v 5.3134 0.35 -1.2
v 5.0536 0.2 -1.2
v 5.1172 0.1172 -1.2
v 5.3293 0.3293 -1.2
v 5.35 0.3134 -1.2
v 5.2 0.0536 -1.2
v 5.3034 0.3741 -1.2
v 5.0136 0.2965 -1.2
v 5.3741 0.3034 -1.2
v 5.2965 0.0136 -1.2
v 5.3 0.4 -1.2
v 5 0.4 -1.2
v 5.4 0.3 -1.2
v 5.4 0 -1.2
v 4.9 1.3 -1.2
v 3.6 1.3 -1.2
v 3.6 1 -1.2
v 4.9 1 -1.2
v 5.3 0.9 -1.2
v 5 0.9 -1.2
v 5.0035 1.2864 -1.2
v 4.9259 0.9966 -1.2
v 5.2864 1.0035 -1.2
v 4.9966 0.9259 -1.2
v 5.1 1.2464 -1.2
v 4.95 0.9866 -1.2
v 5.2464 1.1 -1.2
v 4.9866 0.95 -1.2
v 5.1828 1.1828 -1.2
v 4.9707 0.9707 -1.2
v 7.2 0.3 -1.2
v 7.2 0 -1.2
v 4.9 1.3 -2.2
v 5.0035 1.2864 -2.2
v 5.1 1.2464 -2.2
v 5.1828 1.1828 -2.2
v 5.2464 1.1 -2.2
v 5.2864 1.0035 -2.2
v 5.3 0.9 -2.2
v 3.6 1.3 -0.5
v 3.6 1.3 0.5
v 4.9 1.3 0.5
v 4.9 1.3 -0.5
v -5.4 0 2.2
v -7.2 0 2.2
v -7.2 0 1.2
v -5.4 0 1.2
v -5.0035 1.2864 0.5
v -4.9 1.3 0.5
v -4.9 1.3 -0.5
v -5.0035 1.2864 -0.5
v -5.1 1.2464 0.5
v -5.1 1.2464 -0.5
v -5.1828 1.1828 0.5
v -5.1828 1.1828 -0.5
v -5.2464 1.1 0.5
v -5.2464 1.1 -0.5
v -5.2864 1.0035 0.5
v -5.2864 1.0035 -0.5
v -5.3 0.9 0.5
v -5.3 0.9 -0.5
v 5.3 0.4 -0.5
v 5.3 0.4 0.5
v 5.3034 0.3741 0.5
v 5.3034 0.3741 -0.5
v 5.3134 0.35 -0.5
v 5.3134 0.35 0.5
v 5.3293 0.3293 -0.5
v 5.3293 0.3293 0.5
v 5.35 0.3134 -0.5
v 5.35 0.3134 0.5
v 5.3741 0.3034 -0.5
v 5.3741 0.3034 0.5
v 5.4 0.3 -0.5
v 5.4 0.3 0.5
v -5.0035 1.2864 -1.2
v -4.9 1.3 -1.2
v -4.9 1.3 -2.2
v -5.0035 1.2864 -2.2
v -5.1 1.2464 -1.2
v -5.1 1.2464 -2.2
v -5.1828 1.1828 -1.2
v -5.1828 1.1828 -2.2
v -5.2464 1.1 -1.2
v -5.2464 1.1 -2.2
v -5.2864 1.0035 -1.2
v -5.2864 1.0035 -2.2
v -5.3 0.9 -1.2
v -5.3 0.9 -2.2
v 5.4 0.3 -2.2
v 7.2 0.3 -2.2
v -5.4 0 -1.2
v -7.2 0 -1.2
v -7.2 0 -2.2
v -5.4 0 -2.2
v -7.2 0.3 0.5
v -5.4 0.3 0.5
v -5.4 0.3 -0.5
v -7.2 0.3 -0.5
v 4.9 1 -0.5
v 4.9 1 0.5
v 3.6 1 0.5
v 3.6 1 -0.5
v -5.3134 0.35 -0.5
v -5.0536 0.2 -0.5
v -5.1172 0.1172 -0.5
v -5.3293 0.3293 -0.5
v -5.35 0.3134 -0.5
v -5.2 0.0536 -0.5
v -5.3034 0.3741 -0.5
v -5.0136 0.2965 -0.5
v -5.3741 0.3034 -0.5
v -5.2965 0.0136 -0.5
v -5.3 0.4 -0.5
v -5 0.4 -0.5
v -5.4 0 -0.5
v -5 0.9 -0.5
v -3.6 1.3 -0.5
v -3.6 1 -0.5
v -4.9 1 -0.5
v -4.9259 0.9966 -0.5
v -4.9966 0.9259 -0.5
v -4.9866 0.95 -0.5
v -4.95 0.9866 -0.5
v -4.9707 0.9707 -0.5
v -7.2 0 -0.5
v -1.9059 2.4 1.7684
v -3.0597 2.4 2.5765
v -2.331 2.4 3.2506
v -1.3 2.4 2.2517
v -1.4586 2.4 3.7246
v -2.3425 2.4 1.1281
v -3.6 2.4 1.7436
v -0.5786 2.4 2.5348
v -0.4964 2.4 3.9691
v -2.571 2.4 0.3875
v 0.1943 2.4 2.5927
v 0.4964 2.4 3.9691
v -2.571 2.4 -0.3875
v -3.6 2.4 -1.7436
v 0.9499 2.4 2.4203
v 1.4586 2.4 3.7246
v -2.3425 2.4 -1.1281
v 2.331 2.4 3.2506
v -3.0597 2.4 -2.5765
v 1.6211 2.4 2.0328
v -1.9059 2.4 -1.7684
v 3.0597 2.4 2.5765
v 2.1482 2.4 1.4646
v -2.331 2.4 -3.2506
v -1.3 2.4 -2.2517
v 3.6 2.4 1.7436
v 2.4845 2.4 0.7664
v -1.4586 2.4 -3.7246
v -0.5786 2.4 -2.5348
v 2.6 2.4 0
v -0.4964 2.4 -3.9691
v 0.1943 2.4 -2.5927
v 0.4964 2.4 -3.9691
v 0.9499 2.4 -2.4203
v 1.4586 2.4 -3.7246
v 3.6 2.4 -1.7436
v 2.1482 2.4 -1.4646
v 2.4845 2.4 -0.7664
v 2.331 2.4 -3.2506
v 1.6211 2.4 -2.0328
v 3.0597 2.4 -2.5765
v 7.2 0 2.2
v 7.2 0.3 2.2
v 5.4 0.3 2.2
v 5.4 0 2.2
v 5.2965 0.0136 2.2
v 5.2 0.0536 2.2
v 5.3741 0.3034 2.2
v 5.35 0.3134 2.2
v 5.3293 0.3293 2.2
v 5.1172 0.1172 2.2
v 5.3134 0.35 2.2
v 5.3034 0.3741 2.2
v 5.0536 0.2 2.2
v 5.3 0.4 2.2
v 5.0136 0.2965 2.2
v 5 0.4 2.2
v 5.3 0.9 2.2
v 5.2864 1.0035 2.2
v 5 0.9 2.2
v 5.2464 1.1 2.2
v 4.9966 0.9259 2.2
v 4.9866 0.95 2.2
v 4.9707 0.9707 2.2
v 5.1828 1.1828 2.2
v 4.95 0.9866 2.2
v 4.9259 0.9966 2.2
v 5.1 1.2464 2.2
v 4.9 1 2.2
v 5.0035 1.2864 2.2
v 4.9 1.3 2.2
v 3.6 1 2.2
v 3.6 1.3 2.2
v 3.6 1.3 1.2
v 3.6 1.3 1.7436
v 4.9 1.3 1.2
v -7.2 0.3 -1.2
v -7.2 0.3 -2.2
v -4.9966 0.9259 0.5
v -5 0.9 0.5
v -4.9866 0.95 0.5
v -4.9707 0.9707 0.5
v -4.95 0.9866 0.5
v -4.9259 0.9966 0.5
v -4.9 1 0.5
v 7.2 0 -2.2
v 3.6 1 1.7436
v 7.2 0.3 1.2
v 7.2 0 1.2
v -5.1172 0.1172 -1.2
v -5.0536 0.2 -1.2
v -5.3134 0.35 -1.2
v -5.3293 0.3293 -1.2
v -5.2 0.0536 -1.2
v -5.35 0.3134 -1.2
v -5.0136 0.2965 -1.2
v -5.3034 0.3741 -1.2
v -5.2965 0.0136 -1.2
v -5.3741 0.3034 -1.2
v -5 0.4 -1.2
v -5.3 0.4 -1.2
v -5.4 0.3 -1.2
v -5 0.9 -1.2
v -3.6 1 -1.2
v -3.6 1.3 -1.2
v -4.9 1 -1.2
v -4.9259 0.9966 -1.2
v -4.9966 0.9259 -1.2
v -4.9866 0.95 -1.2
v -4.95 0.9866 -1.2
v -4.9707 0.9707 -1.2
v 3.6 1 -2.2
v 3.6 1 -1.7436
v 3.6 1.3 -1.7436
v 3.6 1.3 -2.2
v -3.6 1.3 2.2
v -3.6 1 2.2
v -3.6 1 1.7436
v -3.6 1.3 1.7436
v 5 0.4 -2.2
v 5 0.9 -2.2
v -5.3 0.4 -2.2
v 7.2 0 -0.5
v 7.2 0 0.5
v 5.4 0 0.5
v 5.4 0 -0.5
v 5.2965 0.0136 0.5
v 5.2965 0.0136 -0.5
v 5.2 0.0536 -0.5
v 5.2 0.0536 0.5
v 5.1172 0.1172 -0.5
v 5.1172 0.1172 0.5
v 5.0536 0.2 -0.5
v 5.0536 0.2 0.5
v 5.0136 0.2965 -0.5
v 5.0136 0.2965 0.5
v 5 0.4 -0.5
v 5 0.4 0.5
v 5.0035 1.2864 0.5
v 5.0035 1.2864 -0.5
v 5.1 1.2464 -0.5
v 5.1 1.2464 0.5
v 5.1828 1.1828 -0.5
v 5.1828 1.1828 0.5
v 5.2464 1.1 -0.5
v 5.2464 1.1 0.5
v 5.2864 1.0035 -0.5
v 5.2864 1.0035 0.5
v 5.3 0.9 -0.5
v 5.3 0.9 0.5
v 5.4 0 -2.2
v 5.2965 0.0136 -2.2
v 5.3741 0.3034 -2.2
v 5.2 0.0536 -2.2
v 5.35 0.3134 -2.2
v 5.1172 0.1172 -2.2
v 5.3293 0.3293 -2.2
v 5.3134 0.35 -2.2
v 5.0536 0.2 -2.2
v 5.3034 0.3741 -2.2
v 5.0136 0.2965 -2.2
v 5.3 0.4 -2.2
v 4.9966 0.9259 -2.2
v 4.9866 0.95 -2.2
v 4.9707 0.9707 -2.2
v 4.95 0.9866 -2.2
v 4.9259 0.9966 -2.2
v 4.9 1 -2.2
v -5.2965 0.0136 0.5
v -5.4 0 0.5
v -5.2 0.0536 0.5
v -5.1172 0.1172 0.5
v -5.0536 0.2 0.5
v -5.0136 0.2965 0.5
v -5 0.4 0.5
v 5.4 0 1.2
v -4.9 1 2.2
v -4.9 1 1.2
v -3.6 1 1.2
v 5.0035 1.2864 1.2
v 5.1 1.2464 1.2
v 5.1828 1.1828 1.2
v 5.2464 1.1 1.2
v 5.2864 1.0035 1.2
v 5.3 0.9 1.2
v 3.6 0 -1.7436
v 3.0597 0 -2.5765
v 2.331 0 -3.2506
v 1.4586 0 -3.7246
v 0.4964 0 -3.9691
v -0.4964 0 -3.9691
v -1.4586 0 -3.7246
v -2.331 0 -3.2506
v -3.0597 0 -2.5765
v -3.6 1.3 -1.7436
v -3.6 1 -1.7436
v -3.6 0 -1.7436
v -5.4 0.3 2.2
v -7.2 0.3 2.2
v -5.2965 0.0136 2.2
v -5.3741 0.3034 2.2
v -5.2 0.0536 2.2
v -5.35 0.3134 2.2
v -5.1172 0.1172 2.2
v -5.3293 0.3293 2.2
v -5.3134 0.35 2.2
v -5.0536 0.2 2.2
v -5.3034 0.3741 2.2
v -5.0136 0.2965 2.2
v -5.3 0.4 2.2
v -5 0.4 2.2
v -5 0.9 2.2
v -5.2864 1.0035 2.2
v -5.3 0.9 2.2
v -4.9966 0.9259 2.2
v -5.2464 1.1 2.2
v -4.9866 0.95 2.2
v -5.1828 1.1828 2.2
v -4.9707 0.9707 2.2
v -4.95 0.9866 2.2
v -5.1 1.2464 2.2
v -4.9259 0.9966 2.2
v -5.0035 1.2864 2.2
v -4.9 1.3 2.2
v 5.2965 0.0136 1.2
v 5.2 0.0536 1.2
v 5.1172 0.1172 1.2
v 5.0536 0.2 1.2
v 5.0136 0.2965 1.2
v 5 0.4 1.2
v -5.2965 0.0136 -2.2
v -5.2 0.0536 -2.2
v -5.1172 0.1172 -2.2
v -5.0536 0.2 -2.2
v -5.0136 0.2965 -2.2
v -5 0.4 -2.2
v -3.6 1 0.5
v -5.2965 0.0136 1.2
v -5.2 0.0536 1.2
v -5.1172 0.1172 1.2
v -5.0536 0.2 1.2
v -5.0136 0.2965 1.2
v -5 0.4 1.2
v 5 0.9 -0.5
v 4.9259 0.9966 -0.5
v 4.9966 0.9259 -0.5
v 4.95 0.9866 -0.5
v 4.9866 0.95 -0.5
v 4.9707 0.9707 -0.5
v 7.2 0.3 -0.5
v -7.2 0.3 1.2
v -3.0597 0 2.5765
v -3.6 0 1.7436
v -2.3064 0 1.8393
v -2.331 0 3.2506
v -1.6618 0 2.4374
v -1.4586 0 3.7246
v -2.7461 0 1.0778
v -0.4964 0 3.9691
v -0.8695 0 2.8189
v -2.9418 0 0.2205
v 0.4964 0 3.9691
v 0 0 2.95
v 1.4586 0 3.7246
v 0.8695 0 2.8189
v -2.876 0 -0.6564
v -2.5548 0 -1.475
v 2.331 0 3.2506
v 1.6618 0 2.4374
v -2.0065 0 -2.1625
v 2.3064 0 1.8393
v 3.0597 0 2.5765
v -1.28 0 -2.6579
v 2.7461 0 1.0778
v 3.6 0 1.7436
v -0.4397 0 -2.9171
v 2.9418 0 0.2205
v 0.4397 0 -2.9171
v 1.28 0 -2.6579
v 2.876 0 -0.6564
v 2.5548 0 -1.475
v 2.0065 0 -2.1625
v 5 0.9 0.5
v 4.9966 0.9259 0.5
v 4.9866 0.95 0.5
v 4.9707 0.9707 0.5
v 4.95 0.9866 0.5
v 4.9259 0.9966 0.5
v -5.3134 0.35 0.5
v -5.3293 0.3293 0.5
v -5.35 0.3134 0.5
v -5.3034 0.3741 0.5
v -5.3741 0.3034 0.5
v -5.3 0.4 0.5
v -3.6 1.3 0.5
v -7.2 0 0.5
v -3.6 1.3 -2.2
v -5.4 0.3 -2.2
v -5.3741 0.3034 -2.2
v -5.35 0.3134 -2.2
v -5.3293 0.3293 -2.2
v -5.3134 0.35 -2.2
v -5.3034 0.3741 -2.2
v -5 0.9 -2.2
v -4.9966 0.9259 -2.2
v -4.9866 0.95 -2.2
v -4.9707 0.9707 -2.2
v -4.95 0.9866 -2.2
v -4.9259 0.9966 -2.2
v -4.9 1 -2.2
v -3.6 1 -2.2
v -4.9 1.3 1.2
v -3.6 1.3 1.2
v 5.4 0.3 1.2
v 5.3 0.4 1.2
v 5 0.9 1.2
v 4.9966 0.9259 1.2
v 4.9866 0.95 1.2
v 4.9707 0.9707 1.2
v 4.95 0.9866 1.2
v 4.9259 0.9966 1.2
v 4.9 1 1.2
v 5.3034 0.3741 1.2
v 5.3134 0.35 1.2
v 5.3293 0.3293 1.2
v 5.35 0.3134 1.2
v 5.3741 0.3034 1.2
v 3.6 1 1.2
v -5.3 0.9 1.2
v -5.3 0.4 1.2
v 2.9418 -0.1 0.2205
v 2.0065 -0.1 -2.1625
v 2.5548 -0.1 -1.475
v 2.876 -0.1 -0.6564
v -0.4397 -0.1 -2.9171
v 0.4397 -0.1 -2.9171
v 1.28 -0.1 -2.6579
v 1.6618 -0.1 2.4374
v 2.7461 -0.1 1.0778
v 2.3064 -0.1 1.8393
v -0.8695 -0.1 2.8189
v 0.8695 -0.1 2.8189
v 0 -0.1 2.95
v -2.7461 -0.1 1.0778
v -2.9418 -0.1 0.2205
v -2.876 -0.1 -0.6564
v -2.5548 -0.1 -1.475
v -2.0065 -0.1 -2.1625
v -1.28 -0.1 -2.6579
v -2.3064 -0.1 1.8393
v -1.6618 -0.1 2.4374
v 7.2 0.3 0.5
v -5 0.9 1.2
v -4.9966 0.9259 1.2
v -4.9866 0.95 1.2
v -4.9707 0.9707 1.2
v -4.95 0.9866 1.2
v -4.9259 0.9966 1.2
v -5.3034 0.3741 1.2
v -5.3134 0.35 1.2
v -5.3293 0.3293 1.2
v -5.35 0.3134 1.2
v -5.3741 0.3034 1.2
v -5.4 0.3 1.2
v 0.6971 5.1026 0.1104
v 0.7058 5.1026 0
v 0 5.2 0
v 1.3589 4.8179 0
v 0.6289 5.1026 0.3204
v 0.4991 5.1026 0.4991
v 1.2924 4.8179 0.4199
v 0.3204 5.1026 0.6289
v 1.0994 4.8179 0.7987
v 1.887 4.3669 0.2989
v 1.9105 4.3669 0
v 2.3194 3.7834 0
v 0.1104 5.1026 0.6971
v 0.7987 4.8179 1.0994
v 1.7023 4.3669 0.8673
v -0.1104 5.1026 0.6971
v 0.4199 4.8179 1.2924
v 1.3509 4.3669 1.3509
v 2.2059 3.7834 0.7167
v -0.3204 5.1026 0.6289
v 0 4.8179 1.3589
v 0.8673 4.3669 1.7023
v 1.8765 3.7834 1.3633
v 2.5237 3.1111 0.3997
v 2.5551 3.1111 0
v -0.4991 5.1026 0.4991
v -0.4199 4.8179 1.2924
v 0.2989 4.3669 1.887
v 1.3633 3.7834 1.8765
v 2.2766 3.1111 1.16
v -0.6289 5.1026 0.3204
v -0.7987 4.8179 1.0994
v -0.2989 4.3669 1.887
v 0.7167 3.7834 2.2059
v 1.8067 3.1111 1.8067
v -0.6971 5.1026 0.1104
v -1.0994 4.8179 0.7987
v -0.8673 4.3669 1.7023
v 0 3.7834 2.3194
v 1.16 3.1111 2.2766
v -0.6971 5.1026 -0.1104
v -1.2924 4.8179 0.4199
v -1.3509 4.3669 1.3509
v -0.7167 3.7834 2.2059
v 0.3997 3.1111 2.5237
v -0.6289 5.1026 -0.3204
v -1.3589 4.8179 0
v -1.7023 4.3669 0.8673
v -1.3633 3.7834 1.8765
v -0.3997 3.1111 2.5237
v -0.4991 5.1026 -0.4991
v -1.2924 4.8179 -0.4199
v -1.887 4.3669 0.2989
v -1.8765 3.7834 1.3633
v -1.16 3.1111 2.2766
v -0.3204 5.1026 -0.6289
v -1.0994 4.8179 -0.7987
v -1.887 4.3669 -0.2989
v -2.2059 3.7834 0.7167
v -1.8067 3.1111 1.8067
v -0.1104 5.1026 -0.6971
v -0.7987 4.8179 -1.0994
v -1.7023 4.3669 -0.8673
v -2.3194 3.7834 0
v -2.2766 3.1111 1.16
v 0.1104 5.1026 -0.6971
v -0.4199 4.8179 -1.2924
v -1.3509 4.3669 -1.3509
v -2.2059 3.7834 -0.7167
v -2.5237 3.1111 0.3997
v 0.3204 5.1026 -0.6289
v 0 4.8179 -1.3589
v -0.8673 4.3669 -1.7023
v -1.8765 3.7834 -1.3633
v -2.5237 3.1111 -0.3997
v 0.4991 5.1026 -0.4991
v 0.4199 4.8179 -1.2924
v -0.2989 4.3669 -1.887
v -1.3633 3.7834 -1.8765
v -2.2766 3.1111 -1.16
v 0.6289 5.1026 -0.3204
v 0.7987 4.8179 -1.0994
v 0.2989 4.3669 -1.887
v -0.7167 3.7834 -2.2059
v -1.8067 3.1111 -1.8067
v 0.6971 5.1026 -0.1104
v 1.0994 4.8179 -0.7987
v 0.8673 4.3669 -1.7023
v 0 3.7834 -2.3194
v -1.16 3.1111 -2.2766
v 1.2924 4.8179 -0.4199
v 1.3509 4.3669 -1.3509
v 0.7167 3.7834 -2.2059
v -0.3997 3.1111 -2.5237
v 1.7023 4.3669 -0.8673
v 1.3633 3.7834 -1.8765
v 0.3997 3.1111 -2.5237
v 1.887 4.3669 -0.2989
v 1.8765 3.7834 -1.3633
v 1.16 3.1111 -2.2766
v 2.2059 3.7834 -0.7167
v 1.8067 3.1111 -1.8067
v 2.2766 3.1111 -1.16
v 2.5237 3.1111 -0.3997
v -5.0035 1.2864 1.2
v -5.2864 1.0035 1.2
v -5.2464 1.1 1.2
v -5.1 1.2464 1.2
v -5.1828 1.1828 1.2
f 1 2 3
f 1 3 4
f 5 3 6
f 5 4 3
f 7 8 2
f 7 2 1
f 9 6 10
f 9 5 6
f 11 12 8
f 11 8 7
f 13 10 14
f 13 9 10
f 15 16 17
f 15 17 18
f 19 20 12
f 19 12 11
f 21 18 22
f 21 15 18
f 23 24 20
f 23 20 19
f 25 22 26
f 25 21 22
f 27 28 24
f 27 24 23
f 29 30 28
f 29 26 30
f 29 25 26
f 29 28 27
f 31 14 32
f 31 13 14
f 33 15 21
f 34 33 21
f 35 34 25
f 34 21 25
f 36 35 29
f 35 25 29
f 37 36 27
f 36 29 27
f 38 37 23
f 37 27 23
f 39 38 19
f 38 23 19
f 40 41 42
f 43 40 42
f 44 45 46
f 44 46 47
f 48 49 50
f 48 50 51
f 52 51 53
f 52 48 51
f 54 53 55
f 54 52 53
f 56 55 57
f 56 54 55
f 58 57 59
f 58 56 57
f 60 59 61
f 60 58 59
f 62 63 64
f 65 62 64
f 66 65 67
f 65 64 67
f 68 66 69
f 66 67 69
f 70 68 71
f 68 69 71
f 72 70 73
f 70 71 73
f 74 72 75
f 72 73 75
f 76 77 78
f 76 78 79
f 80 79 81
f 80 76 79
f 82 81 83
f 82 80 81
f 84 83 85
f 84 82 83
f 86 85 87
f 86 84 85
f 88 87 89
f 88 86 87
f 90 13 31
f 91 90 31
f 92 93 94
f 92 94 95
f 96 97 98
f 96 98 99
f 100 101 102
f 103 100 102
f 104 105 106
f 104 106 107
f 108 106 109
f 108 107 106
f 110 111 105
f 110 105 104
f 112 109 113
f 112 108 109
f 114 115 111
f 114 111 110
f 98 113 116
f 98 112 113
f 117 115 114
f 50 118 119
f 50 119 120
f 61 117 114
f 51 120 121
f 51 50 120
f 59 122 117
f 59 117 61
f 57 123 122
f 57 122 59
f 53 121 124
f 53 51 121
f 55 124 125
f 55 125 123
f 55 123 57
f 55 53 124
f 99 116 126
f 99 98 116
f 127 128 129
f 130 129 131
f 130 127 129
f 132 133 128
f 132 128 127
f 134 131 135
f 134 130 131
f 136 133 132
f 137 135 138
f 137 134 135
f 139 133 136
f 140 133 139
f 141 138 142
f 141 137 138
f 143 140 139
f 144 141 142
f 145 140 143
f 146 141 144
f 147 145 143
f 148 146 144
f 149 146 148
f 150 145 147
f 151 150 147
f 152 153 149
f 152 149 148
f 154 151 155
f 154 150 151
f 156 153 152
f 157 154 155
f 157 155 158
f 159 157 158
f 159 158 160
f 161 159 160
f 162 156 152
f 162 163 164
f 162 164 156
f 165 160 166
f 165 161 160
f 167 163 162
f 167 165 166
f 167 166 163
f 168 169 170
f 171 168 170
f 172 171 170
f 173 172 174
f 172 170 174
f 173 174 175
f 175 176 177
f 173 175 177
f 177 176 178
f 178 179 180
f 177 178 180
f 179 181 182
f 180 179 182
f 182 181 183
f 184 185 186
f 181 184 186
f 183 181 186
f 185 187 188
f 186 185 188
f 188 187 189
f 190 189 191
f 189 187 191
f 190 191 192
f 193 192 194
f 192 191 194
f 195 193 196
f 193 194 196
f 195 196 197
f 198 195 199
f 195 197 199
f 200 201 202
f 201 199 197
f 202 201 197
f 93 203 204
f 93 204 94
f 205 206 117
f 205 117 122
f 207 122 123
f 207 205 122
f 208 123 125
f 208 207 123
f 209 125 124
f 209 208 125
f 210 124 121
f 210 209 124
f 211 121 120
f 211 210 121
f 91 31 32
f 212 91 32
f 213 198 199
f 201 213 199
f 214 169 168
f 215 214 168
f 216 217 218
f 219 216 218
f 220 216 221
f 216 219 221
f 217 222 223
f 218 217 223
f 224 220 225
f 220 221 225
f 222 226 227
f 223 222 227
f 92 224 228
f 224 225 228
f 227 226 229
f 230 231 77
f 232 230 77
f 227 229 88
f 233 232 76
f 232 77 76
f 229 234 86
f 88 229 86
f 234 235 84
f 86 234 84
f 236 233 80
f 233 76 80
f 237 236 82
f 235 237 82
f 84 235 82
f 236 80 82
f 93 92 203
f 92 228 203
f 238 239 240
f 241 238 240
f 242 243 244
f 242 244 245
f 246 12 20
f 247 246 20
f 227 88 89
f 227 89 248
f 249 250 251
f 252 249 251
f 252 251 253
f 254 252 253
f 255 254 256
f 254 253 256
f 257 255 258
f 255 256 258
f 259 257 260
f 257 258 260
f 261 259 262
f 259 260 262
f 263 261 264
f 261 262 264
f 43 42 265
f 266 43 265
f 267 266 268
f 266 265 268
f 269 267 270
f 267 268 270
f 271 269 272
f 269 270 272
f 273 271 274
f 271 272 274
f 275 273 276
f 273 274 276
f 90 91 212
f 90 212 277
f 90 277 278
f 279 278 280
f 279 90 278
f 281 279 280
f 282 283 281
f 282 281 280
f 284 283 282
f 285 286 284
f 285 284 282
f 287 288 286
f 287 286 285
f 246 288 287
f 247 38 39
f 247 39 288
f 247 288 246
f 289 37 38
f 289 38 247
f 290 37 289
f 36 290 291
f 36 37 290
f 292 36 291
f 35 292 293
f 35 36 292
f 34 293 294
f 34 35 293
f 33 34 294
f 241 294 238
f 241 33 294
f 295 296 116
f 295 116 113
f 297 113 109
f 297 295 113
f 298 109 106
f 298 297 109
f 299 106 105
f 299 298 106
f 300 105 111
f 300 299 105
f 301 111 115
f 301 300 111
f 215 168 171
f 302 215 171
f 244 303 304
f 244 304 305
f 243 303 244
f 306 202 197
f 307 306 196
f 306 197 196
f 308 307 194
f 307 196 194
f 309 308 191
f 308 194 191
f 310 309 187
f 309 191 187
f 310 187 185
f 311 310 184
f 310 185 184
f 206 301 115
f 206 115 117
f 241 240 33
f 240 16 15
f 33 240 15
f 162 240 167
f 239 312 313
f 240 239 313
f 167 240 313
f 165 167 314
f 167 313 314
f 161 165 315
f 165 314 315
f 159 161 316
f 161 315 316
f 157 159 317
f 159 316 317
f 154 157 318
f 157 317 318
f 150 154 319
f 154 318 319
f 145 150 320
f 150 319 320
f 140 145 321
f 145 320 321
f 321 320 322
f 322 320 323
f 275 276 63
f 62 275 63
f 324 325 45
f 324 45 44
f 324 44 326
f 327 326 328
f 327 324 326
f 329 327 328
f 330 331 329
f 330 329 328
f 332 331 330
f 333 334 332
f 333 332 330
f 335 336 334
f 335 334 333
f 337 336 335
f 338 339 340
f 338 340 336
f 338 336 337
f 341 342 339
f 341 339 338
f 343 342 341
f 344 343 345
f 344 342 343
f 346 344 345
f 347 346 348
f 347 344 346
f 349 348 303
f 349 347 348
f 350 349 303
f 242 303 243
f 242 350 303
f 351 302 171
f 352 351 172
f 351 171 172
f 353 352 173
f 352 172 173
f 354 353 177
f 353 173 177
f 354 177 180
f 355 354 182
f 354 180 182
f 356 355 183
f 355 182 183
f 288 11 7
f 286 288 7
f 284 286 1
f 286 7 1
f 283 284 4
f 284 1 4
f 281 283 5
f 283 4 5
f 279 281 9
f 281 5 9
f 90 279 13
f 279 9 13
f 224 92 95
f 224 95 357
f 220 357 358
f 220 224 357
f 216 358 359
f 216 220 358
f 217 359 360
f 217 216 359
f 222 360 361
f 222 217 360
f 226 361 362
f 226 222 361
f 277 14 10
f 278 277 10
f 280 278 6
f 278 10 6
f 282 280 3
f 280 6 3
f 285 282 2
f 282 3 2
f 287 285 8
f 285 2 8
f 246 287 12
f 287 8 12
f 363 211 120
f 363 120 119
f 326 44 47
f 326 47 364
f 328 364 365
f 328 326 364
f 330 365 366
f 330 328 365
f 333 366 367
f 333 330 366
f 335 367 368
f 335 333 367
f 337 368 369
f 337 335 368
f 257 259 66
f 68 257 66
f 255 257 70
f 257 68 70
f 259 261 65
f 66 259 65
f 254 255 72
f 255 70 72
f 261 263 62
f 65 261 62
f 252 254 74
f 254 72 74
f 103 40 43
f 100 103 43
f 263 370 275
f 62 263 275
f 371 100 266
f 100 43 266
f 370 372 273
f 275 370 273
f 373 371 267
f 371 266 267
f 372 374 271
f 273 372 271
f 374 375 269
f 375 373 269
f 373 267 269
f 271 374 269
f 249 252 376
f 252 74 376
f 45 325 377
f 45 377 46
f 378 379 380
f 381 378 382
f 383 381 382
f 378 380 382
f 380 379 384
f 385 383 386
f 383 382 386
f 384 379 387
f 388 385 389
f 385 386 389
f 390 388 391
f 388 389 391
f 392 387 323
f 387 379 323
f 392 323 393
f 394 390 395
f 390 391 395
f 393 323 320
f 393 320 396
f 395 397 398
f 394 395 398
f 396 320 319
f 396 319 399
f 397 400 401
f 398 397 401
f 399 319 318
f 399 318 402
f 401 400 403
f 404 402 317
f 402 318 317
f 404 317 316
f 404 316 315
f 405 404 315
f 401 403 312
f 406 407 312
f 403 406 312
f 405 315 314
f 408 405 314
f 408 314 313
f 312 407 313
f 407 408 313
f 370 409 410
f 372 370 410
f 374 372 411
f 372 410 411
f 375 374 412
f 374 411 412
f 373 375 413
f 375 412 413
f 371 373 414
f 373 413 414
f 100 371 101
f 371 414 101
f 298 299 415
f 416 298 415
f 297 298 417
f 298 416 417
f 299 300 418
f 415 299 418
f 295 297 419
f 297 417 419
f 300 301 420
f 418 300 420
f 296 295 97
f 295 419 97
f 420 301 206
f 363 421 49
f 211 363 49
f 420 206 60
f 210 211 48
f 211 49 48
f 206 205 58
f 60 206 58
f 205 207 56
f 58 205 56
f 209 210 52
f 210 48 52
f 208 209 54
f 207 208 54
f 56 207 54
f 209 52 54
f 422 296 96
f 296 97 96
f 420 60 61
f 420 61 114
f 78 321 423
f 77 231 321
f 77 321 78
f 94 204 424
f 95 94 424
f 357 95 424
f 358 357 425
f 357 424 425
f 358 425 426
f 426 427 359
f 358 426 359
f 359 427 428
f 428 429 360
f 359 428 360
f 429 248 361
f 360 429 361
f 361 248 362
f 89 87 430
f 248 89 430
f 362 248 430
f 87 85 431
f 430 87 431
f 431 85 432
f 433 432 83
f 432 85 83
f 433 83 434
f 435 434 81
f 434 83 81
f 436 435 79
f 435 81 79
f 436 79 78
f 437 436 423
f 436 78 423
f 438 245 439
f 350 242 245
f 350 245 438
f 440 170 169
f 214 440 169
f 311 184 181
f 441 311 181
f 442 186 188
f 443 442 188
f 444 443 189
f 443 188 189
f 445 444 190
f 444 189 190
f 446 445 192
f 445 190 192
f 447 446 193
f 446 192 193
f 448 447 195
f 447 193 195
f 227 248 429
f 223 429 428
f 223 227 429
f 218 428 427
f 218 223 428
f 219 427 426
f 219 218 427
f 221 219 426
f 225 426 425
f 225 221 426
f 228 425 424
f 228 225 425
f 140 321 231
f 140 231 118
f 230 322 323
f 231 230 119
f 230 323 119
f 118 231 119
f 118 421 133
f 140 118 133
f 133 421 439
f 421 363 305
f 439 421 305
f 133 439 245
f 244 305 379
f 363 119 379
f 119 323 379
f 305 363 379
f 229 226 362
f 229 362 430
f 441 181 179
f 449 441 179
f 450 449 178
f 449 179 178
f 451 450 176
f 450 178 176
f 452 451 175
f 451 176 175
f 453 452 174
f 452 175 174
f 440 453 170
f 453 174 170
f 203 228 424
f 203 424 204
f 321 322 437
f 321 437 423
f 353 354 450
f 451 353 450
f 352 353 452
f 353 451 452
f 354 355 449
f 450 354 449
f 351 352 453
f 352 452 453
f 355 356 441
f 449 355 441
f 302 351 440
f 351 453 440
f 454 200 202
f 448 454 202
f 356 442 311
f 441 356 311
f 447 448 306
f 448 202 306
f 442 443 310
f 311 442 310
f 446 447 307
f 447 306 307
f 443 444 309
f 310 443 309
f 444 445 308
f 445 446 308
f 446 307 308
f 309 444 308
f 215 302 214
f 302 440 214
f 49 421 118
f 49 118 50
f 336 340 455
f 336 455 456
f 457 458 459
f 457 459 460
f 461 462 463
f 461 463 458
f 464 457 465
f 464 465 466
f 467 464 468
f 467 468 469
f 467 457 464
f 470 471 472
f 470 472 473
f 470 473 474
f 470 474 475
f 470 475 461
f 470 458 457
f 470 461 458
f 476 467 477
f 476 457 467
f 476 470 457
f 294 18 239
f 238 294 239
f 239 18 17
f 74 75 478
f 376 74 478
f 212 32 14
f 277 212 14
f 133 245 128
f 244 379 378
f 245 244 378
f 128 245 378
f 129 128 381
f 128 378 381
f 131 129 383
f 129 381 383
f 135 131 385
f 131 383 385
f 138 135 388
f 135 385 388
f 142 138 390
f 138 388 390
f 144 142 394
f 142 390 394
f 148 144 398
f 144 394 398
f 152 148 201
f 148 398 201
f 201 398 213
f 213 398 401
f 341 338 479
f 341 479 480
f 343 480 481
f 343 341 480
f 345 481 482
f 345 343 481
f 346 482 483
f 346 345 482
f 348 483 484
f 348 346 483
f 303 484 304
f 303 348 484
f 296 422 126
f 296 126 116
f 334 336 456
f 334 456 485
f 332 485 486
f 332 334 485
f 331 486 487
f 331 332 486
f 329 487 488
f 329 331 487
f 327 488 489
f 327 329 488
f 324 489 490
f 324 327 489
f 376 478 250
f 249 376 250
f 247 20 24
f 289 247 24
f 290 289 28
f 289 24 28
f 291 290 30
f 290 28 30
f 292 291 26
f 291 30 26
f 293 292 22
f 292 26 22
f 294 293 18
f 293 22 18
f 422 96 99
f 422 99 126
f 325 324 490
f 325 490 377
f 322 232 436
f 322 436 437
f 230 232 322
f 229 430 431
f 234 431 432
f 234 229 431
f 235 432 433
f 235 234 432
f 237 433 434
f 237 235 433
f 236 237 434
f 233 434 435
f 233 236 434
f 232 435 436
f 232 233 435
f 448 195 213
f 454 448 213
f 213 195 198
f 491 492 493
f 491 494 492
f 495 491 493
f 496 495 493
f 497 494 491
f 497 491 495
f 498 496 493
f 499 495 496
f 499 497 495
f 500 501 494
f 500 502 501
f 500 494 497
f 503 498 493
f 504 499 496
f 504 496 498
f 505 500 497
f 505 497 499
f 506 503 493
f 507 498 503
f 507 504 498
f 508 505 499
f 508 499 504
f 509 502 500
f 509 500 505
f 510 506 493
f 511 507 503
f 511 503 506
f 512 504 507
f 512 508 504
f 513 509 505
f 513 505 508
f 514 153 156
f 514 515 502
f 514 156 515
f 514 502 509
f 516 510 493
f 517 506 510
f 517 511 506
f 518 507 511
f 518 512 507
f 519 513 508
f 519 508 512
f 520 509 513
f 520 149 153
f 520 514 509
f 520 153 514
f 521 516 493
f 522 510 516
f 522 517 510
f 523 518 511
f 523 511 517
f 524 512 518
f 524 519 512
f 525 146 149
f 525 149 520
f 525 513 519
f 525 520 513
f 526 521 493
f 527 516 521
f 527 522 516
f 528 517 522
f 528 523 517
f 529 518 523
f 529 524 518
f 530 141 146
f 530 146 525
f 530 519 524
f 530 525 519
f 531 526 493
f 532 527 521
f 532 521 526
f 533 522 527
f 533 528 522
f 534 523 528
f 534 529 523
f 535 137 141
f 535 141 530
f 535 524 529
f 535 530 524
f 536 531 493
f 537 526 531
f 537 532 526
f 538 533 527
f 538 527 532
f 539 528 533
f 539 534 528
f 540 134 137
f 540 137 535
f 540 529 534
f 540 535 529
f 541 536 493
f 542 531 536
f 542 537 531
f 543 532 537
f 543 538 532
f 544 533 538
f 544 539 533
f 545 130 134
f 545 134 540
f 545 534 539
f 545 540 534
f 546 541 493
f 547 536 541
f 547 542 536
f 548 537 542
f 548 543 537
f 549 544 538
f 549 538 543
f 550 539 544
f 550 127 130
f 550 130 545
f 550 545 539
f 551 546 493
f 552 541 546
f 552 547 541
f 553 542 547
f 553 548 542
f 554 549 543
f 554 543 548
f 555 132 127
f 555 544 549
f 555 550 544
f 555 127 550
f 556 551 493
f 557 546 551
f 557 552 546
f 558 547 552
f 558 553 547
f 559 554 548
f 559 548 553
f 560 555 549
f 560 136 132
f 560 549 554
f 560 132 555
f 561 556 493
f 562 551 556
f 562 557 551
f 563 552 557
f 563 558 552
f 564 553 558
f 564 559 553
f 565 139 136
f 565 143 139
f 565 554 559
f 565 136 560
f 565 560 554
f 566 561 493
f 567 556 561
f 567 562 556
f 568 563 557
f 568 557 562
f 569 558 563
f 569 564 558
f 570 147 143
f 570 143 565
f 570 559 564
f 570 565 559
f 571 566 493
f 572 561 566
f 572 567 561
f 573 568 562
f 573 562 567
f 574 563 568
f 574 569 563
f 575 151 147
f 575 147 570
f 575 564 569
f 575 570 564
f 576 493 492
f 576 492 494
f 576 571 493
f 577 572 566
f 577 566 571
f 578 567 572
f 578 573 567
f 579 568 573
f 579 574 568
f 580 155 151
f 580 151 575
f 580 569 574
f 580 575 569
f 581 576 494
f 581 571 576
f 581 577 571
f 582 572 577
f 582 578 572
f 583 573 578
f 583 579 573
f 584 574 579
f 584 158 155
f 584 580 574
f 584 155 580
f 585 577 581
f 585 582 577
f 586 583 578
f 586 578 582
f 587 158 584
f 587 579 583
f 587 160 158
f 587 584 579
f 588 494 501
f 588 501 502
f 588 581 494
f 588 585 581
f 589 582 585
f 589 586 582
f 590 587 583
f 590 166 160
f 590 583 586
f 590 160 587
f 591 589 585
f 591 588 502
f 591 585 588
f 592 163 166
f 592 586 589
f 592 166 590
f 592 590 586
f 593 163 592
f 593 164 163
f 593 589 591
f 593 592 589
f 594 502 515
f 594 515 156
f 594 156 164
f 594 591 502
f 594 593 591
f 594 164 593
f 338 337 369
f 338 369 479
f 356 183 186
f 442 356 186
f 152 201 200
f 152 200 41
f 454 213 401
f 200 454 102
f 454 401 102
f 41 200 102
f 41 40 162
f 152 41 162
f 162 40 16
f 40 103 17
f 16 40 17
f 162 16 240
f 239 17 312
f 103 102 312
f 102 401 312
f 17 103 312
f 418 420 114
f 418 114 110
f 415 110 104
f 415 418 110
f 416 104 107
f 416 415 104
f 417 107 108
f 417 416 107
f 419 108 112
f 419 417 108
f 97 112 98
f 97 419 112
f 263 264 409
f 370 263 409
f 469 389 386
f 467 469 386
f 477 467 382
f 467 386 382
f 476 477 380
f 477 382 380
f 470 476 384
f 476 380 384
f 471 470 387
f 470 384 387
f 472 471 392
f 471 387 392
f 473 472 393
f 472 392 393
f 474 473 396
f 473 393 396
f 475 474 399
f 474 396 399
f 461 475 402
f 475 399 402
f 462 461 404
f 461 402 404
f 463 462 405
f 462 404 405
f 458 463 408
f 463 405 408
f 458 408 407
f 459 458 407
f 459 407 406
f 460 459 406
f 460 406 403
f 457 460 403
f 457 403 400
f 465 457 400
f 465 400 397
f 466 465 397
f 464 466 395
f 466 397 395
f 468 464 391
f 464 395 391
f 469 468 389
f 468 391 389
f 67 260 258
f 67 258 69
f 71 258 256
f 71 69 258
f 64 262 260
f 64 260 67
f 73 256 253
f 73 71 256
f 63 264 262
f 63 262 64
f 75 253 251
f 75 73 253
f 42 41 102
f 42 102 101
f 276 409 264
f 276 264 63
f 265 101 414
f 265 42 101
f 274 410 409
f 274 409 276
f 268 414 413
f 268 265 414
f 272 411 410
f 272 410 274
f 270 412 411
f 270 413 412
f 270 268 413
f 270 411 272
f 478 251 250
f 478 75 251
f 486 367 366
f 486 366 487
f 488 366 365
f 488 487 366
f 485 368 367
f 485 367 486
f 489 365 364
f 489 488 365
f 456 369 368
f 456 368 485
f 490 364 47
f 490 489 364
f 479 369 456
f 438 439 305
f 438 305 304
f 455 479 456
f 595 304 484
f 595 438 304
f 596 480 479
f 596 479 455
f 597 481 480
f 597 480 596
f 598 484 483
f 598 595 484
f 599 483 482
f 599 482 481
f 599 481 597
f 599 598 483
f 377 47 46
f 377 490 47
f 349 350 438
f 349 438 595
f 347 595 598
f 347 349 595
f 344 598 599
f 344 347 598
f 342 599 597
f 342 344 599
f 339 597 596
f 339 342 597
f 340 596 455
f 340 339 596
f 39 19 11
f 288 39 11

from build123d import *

# Parameters (mm, degrees)
LED_BASE_BOSS_EXTRUDE1_DEPTH       = 2.4
PIN_RIGHT_BOSS_EXTRUDE2_DEPTH      = 2.2
PIN_RIGHT_SPACE_CUT_EXTRUDE1_REACH = 11.113
SKETCH5_W                          = 3.6
SKETCH5_H                          = 0.7
SKETCH6_R                          = 2.95
HEATSINK_BOSS_EXTRUDE3_DEPTH       = 0.1


with BuildPart() as part:
    # Sketch1 → LED Base Boss-Extrude1 (new body)
    with BuildSketch(Plane(origin=(0, 0, 0), x_dir=(1, 0, 0), z_dir=(0, 1, 0))):
        with BuildLine():
            Line((-3.6, 1.743559577), (-3.6, -1.743559577))
            ThreePointArc((-3.6, -1.743559577), (0, -4), (3.6, -1.743559577))
            Line((3.6, -1.743559577), (3.6, 1.743559577))
            ThreePointArc((3.6, 1.743559577), (0, 4), (-3.6, 1.743559577))
        make_face()
    extrude(amount=LED_BASE_BOSS_EXTRUDE1_DEPTH)

    # Sketch3 → LED Lens Revolve2 (revolve)
    with BuildSketch(Plane.XY):
        with BuildLine():
            Line((2.6, 2.4), (0, 2.4))
            Line((0, 2.4), (0, 5.2))
            ThreePointArc((0, 5.2), (1.910497317, 4.366890366), (2.6, 2.4))
        make_face()
    revolve(axis=Axis((0, 5.2, 0), (0, -1, 0)))

    # Sketch4 → Pin Right Boss-Extrude2 (add, symmetric)
    with BuildSketch(Plane.XY):
        with BuildLine():
            Line((3.6, 1.3), (4.9, 1.3))
            ThreePointArc((4.9, 1.3), (5.182842712, 1.182842712), (5.3, 0.9))
            Line((5.3, 0.9), (5.3, 0.4))
            ThreePointArc((5.3, 0.4), (5.329289322, 0.329289322), (5.4, 0.3))
            Line((5.4, 0.3), (7.2, 0.3))
            Line((7.2, 0.3), (7.2, 0))
            Line((7.2, 0), (5.4, 0))
            ThreePointArc((5.4, 0), (5.117157288, 0.117157288), (5, 0.4))
            Line((5, 0.4), (5, 0.9))
            ThreePointArc((5, 0.9), (4.970710678, 0.970710678), (4.9, 1))
            Line((4.9, 1), (3.6, 1))
            Line((3.6, 1), (3.6, 1.3))
        make_face()
    pin_right_boss_extrude2 = extrude(amount=PIN_RIGHT_BOSS_EXTRUDE2_DEPTH, both=True)

    # Pin Right Space Cut-Extrude1: up to this face of the body (flat: up to its plane)
    pin_right_space_cut_extrude1_end = Plane(part.part.faces().sort_by_distance((6.3, 0, 0))[0])
    # Sketch5 → Pin Right Space Cut-Extrude1 (cut, up to the picked face)
    with BuildSketch(Plane(origin=(0, 1.3, 0), x_dir=(1, 0, 0), z_dir=(0, 1, 0)), mode=Mode.PRIVATE) as pin_right_space_cut_extrude1_sk1:
        with Locations((5.4, 0.85)):
            Rectangle(SKETCH5_W, SKETCH5_H)
    pin_right_space_cut_extrude1_tool1 = split(extrude(pin_right_space_cut_extrude1_sk1.sketch, amount=-PIN_RIGHT_SPACE_CUT_EXTRUDE1_REACH, mode=Mode.PRIVATE), bisect_by=pin_right_space_cut_extrude1_end, keep=Keep.BOTH, mode=Mode.PRIVATE)
    # Sketch5 → Pin Right Space Cut-Extrude1 (cut, up to the picked face)
    with BuildSketch(Plane(origin=(0, 1.3, 0), x_dir=(1, 0, 0), z_dir=(0, 1, 0)), mode=Mode.PRIVATE) as pin_right_space_cut_extrude1_sk2:
        with Locations((5.4, -0.85)):
            Rectangle(SKETCH5_W, SKETCH5_H)
    pin_right_space_cut_extrude1_tool2 = split(extrude(pin_right_space_cut_extrude1_sk2.sketch, amount=-PIN_RIGHT_SPACE_CUT_EXTRUDE1_REACH, mode=Mode.PRIVATE), bisect_by=pin_right_space_cut_extrude1_end, keep=Keep.BOTH, mode=Mode.PRIVATE)
    pin_right_space_cut_extrude1_1 = pin_right_space_cut_extrude1_tool1.solids().sort_by(Axis((5.4, 1.3, -0.85), (0, -1, 0)))[0]
    add(pin_right_space_cut_extrude1_1, mode=Mode.SUBTRACT)
    pin_right_space_cut_extrude1_2 = pin_right_space_cut_extrude1_tool2.solids().sort_by(Axis((5.4, 1.3, 0.85), (0, -1, 0)))[0]
    add(pin_right_space_cut_extrude1_2, mode=Mode.SUBTRACT)
    pin_right_space_cut_extrude1 = pin_right_space_cut_extrude1_1 + pin_right_space_cut_extrude1_2  # Pin Right Space Cut-Extrude1 as one shape, for the pattern or mirror that repeats it

    # Pin Left Mirror1: Pin Right Boss-Extrude2, Pin Right Space Cut-Extrude1 across plane
    add(pin_right_boss_extrude2.mirror(Plane(origin=(0, 0, 0), x_dir=(0, 0, 1), z_dir=(1, 0, 0))))
    add(pin_right_space_cut_extrude1.mirror(Plane(origin=(0, 0, 0), x_dir=(0, 0, 1), z_dir=(1, 0, 0))), mode=Mode.SUBTRACT)

    # Sketch6 → Heatsink Boss-Extrude3 (add)
    with BuildSketch(Plane.XZ):
        with Locations(Location((0, 0, 0), (0, 0, 90))):
            Circle(SKETCH6_R)
    extrude(amount=HEATSINK_BOSS_EXTRUDE3_DEPTH)


solid = part.part
